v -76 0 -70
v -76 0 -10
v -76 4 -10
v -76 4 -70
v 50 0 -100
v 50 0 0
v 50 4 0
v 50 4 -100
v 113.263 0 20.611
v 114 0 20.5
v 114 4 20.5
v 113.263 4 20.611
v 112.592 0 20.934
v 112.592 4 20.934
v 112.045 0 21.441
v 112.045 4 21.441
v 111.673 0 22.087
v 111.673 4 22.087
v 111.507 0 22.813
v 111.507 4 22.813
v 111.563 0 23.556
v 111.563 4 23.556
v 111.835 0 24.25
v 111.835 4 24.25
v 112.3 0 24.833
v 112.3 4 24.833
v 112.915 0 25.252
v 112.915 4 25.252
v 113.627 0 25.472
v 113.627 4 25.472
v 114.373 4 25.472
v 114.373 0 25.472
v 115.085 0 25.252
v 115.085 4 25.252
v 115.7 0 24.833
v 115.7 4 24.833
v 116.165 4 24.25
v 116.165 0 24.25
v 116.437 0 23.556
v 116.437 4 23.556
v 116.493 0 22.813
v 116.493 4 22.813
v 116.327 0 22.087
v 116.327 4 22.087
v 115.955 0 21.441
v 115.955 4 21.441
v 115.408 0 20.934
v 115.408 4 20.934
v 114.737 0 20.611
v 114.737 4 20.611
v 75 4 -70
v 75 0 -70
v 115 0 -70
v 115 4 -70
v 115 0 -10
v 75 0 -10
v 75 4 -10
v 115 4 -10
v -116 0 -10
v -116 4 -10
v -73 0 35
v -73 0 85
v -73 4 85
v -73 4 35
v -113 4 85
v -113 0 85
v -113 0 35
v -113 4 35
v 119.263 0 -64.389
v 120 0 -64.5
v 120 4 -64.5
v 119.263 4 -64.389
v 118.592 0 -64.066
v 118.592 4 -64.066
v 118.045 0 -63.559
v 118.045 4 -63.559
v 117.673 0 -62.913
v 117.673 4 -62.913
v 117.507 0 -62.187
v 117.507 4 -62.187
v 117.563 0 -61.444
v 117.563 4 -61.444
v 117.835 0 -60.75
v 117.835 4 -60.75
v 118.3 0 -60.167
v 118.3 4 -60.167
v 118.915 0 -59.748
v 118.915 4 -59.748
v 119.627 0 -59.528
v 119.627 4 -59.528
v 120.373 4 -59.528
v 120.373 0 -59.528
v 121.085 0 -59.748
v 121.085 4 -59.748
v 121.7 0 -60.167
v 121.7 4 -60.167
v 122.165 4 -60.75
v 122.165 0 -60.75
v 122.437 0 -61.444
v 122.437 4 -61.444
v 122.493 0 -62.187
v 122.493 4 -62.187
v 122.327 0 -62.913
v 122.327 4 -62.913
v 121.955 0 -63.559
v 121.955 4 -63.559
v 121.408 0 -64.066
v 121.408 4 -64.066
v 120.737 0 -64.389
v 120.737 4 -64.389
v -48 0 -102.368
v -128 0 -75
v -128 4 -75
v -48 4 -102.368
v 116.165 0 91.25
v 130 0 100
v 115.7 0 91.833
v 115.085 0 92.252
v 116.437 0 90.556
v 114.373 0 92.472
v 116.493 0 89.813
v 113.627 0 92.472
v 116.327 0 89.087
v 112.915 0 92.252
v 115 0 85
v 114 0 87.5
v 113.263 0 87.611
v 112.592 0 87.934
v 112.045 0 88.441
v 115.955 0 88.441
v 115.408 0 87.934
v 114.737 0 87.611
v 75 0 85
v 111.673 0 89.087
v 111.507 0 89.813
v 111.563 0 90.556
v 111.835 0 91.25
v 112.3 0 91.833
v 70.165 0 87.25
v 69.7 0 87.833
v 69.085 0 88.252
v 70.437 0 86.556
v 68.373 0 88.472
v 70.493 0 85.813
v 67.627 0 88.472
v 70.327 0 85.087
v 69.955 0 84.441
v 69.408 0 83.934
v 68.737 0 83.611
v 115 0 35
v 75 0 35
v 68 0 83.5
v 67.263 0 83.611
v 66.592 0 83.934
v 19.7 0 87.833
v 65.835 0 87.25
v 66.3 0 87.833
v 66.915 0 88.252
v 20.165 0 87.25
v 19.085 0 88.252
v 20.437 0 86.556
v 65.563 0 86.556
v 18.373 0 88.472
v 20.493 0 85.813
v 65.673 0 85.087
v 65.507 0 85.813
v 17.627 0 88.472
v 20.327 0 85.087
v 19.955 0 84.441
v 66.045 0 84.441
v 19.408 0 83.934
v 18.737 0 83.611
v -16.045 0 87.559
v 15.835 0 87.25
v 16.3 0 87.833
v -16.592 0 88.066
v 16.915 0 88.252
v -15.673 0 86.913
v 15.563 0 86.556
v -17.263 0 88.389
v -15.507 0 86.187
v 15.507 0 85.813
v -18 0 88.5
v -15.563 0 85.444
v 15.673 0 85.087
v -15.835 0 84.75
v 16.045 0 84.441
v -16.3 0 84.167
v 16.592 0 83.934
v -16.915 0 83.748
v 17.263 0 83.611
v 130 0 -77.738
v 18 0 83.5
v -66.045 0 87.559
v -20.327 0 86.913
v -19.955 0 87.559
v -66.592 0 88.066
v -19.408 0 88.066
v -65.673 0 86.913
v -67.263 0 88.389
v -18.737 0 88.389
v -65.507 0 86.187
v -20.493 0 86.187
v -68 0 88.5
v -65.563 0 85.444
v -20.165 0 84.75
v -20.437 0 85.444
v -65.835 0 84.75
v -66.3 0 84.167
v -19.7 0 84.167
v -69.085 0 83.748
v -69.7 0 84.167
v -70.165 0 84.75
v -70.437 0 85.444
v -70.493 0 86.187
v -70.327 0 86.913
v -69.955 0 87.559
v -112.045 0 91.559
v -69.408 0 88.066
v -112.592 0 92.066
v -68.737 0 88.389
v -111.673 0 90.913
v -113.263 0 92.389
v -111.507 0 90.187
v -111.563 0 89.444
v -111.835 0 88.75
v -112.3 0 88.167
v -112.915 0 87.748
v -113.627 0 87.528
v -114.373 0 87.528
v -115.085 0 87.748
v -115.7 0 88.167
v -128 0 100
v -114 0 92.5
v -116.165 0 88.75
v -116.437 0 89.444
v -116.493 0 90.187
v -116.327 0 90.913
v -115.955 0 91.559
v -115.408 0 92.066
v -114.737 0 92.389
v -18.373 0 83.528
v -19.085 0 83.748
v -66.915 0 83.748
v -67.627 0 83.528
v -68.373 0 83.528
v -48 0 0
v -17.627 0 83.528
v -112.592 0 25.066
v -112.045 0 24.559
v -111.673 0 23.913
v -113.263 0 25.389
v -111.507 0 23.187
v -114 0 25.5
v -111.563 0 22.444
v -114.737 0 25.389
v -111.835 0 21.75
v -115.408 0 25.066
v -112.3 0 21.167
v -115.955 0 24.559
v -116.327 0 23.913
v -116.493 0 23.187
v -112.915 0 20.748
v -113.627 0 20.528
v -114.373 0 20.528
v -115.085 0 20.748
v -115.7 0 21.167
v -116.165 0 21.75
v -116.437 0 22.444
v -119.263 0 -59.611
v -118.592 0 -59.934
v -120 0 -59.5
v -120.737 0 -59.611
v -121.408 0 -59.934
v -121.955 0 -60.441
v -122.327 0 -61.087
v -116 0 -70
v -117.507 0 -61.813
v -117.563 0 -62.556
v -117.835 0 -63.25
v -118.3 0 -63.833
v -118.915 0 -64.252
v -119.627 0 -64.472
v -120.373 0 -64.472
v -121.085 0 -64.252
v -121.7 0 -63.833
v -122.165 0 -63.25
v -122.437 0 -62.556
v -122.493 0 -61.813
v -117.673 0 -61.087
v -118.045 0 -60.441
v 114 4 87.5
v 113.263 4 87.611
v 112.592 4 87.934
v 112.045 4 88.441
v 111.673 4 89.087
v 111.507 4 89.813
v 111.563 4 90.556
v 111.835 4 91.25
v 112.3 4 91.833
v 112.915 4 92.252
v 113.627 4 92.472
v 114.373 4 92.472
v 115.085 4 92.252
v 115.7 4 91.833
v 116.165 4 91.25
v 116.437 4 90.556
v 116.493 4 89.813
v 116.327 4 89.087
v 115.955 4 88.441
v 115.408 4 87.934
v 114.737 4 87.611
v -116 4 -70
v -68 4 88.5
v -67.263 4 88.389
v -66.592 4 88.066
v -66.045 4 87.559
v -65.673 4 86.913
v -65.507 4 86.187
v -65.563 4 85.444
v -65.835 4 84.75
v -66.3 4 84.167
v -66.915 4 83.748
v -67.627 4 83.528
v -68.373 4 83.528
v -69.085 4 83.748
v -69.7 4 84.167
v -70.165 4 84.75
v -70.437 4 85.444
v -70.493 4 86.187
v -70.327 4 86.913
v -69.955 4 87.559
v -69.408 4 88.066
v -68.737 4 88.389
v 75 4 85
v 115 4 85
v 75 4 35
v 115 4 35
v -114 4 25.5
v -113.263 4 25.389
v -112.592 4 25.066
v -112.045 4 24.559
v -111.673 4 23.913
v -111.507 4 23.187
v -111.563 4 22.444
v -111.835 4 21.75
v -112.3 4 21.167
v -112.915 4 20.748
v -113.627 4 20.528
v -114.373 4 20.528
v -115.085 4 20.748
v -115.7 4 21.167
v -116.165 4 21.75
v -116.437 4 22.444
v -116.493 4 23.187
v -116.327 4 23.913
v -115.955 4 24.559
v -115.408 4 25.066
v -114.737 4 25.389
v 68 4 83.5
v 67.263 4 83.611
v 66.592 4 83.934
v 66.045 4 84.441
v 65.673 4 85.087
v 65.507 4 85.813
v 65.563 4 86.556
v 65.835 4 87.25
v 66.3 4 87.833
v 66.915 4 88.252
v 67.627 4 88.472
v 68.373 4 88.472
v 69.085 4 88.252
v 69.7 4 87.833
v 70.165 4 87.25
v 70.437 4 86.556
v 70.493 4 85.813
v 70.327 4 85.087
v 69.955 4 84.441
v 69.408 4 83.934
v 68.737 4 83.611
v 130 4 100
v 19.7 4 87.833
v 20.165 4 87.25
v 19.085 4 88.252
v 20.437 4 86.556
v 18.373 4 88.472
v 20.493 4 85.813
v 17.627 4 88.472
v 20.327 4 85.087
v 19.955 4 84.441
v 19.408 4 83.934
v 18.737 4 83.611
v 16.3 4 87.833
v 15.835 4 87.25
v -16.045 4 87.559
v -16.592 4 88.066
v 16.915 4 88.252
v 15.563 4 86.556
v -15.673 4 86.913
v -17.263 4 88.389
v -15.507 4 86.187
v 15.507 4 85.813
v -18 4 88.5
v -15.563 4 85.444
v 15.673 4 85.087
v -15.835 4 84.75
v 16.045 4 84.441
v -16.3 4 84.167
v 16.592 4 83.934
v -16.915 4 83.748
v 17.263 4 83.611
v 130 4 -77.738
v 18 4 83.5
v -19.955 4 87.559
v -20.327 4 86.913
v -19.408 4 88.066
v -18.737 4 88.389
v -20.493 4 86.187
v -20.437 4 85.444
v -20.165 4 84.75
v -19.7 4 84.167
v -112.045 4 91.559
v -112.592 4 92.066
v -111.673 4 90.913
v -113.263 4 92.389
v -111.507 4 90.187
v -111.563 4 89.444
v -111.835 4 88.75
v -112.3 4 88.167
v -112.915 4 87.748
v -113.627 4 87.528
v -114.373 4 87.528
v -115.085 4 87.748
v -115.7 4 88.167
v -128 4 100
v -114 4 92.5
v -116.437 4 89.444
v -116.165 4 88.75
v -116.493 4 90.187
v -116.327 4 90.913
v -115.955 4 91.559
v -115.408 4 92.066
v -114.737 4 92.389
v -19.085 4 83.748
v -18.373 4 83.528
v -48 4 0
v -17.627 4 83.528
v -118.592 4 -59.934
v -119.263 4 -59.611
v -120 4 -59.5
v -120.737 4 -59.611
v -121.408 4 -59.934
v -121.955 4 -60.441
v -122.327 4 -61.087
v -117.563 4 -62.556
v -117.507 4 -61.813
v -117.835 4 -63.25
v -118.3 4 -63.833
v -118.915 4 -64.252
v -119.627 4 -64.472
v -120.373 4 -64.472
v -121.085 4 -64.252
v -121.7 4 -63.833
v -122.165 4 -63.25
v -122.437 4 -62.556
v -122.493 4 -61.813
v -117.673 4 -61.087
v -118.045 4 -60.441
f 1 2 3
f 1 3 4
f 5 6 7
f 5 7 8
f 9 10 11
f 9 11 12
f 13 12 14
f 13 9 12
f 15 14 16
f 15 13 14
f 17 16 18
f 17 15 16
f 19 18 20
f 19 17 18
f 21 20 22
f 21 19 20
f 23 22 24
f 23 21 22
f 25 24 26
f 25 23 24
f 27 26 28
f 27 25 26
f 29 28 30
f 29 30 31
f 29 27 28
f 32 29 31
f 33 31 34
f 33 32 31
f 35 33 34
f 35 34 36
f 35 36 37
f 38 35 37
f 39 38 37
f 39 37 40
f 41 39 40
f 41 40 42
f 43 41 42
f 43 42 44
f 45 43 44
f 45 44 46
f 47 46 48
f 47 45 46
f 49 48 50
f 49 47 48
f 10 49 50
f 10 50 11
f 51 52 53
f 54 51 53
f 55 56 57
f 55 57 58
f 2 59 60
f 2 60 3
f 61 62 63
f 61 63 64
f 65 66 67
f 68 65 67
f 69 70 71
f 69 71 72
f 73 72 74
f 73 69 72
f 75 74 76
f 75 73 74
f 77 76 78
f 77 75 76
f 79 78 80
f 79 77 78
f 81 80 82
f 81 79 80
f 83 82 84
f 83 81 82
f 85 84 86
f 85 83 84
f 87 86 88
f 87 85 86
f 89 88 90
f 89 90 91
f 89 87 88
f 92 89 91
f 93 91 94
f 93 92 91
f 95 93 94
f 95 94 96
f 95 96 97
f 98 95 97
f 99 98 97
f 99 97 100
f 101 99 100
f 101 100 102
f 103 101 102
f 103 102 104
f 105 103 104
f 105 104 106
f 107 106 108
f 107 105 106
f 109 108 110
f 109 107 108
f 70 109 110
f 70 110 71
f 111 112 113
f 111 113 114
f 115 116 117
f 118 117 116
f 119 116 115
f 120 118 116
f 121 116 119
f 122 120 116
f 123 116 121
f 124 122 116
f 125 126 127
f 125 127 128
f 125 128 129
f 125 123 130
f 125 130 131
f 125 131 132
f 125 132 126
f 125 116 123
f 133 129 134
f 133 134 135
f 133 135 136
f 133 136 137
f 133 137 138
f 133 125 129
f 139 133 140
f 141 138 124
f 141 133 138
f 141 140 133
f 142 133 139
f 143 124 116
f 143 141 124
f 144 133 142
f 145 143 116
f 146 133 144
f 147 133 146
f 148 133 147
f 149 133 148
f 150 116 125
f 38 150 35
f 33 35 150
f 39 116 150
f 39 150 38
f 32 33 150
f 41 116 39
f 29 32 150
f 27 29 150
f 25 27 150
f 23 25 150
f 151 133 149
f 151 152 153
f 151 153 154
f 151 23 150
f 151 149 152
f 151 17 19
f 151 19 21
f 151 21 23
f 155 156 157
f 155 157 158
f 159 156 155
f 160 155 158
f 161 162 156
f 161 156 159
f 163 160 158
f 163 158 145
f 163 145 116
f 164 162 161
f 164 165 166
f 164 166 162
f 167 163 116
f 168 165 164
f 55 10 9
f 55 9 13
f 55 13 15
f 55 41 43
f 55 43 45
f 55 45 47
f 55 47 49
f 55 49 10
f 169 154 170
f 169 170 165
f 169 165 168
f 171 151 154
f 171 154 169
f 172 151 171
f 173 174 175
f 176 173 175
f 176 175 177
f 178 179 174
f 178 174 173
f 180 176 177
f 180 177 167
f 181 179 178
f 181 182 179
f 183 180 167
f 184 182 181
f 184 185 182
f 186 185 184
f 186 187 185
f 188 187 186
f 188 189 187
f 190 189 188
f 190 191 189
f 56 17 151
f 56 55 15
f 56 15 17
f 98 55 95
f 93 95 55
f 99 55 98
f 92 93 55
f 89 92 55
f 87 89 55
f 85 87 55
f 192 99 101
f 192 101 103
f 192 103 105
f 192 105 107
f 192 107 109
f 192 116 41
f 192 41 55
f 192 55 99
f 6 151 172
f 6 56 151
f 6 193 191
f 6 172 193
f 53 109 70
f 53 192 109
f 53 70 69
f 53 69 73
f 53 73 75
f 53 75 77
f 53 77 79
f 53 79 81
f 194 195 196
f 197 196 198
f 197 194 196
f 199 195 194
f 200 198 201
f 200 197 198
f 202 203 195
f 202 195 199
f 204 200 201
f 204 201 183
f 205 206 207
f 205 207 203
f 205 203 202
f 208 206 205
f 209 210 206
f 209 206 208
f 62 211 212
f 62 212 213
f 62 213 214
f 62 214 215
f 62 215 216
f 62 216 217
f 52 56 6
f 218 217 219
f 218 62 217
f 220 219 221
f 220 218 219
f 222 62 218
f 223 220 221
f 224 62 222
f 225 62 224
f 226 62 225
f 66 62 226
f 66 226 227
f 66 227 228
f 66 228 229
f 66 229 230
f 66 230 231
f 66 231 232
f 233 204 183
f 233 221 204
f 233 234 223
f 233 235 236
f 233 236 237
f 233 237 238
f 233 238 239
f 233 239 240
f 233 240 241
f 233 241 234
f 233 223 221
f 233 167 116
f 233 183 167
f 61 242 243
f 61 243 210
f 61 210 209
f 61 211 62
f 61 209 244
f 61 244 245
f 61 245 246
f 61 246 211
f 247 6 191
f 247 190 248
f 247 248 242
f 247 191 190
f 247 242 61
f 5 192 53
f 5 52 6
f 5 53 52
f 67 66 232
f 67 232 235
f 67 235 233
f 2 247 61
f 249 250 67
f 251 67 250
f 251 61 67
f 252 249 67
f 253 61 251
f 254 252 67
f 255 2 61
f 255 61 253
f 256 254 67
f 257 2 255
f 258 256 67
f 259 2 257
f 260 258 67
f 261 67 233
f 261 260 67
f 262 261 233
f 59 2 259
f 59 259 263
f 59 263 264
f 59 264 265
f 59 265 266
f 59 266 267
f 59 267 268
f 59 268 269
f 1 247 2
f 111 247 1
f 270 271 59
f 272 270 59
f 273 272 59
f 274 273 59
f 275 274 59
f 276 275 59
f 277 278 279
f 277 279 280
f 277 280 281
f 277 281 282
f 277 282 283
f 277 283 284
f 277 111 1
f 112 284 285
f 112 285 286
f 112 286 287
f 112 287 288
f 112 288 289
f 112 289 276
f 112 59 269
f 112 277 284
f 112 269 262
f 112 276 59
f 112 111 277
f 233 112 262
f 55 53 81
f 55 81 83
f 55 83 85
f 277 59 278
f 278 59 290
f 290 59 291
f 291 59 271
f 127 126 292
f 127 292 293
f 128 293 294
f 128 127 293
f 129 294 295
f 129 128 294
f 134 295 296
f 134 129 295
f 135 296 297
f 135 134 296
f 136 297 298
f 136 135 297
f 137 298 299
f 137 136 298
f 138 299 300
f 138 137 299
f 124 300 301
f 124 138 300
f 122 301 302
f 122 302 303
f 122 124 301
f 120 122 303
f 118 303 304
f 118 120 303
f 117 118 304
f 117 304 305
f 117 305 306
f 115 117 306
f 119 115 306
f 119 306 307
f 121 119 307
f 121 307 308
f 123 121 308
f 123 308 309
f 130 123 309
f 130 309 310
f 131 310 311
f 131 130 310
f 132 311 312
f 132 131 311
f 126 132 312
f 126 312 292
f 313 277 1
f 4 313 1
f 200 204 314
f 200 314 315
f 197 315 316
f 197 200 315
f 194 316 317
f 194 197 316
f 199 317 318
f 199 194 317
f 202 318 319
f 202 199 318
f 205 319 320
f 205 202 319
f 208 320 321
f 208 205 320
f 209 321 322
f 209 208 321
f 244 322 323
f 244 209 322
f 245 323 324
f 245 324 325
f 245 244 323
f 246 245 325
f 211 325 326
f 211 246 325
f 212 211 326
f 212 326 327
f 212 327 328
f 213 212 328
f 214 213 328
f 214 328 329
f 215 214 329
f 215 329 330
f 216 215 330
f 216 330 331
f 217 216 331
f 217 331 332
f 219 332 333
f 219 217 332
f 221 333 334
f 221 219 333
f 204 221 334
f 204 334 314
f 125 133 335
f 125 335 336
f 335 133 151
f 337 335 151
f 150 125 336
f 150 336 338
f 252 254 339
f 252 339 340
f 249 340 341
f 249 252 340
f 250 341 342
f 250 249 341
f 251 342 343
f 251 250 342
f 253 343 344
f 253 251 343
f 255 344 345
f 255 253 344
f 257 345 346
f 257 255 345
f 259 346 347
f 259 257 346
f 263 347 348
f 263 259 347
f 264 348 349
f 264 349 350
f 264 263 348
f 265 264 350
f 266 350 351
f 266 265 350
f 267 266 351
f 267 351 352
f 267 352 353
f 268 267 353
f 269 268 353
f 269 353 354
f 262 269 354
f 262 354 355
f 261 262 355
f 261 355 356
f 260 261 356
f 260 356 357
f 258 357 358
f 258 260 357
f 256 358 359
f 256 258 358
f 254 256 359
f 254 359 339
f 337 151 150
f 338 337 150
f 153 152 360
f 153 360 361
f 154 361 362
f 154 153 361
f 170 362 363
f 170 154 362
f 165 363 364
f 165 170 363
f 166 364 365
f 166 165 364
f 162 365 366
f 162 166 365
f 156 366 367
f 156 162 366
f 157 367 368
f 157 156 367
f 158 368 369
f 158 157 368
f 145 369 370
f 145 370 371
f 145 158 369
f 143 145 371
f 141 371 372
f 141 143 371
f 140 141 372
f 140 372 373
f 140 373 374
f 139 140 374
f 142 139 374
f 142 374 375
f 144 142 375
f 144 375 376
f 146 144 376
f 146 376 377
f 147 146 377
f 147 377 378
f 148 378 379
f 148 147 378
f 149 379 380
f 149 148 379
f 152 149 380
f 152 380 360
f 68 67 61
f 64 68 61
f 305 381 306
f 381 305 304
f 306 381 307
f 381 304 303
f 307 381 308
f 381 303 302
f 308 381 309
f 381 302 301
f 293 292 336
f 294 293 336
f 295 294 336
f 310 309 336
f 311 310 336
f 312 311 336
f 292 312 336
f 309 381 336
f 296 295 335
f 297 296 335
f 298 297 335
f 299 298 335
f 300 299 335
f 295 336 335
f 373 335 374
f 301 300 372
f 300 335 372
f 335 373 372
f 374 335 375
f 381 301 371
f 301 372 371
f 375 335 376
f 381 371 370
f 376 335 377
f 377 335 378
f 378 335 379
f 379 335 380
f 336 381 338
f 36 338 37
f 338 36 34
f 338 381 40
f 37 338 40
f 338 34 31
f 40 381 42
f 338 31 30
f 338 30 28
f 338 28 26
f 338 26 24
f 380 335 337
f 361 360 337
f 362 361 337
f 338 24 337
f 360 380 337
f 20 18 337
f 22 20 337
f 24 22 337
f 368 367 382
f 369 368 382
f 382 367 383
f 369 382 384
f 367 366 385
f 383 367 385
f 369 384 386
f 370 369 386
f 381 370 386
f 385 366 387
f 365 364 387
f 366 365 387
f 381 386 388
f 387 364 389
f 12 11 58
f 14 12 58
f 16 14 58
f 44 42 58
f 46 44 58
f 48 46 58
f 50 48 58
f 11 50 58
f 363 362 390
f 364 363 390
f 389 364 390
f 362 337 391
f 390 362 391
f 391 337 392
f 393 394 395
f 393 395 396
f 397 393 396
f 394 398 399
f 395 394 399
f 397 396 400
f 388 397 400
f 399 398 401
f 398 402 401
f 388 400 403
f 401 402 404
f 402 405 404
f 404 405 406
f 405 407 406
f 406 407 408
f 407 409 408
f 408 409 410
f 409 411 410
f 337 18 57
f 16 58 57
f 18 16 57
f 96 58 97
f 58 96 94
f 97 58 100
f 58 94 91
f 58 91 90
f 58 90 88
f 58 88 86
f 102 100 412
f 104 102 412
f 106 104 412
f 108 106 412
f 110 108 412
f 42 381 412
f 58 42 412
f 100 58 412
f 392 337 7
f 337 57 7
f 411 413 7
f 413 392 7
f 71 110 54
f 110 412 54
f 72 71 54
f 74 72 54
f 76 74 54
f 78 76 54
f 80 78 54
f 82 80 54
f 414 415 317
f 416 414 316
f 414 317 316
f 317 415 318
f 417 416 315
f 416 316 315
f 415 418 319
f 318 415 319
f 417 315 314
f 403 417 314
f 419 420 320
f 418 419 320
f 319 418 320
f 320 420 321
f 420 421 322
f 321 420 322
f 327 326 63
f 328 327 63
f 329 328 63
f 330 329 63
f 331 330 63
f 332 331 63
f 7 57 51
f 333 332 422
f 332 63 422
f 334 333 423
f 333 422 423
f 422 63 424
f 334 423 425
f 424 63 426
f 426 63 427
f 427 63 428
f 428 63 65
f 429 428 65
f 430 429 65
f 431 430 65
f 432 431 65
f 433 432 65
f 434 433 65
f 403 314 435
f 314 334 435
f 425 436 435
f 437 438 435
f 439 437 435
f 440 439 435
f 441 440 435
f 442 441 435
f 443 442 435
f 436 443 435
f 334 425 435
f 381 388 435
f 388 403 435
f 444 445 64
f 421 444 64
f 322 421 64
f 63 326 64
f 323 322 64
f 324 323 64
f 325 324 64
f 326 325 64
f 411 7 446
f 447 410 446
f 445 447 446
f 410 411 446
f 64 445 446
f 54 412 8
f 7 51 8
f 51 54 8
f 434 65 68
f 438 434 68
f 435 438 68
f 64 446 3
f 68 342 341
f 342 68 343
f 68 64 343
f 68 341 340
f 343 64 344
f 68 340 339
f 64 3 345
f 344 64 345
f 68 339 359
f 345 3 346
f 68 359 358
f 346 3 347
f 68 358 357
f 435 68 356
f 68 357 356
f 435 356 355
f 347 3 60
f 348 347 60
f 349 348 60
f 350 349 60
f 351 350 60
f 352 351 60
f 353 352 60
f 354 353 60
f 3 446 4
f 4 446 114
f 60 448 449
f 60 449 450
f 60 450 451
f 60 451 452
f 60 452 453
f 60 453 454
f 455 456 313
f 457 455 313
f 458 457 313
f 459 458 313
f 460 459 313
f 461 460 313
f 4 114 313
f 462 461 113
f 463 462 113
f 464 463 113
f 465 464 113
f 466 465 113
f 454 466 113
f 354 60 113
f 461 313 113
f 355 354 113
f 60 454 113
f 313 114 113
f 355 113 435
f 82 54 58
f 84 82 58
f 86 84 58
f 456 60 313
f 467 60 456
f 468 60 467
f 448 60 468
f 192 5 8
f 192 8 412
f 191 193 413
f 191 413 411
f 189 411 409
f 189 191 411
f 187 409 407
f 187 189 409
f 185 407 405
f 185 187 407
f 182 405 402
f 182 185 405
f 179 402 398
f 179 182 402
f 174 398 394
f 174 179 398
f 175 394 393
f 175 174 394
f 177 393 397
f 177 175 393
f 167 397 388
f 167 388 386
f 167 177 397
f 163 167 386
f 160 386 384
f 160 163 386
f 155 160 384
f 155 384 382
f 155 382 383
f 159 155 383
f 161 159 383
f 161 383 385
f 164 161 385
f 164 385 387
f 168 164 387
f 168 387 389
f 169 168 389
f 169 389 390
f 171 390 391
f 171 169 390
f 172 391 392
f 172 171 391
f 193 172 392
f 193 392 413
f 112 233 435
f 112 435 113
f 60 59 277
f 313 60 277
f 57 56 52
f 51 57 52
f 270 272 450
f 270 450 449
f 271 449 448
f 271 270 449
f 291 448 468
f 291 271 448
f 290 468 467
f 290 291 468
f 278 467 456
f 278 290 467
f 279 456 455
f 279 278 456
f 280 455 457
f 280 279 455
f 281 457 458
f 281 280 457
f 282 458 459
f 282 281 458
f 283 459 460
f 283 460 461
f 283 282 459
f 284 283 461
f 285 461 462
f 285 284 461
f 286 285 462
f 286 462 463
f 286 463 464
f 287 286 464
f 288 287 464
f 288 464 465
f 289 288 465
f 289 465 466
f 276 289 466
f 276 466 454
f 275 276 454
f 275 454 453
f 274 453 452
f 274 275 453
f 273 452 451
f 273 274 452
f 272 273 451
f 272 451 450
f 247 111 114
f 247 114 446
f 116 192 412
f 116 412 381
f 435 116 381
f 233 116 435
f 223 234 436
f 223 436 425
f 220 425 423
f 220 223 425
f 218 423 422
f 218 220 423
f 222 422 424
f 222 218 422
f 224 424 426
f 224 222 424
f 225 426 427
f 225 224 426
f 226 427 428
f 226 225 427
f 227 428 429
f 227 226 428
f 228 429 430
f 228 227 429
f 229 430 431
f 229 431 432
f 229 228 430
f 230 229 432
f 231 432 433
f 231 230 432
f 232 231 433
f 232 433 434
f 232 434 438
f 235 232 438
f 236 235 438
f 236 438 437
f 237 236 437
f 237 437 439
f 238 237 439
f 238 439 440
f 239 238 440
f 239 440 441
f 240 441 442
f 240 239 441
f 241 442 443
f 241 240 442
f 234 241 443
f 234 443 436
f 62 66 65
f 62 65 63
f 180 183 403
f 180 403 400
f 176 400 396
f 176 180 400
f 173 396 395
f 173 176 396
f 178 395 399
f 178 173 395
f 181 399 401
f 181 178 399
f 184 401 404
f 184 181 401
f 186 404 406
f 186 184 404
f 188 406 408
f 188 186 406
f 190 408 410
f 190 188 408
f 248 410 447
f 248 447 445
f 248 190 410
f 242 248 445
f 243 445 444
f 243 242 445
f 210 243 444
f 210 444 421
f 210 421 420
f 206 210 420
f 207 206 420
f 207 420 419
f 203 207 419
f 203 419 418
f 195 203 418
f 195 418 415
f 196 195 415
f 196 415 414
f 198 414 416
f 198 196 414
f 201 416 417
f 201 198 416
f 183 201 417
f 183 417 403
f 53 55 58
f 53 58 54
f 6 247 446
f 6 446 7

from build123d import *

# Parameters (mm, degrees)
SKETCH1_R           = 2.5
SKETCH1_W           = 40
SKETCH1_H           = 50
SKETCH1_H_2         = 60
BOSS_EXTRUDE1_DEPTH = 4


with BuildPart() as part:
    # Sketch1 → Boss-Extrude1 (new body)
    with BuildSketch(Plane(origin=(0, 0, 0), x_dir=(1, 0, 0), z_dir=(0, 1, 0))):
        Polygon((-48, 102.368421053), (-48, 0), (50, 0), (50, 100), (130, 77.738349066), (130, -100), (-128, -100), (-128, 75), align=None)
        with Locations(Location((-114, -90, 0), (0, 0, 270))):
            Circle(SKETCH1_R, mode=Mode.SUBTRACT)
        with Locations(Location((-68, -86, 0), (0, 0, 270))):
            Circle(SKETCH1_R, mode=Mode.SUBTRACT)
        with Locations(Location((-18, -86, 0), (0, 0, 270))):
            Circle(SKETCH1_R, mode=Mode.SUBTRACT)
        with Locations(Location((-120, 62, 0), (0, 0, 270))):
            Circle(SKETCH1_R, mode=Mode.SUBTRACT)
        with Locations(Location((-114, -23, 0), (0, 0, 270))):
            Circle(SKETCH1_R, mode=Mode.SUBTRACT)
        with Locations(Location((18, -86, 0), (0, 0, 90))):
            Circle(SKETCH1_R, mode=Mode.SUBTRACT)
        with Locations(Location((68, -86, 0), (0, 0, 90))):
            Circle(SKETCH1_R, mode=Mode.SUBTRACT)
        with Locations(Location((114, -90, 0), (0, 0, 90))):
            Circle(SKETCH1_R, mode=Mode.SUBTRACT)
        with Locations(Location((114, -23, 0), (0, 0, 90))):
            Circle(SKETCH1_R, mode=Mode.SUBTRACT)
        with Locations(Location((120, 62, 0), (0, 0, 90))):
            Circle(SKETCH1_R, mode=Mode.SUBTRACT)
        with Locations((95, -60)):
            Rectangle(SKETCH1_W, SKETCH1_H, mode=Mode.SUBTRACT)
        with Locations((95, 40)):
            Rectangle(SKETCH1_W, SKETCH1_H_2, mode=Mode.SUBTRACT)
        with Locations((-96, 40)):
            Rectangle(SKETCH1_W, SKETCH1_H_2, mode=Mode.SUBTRACT)
        with Locations((-93, -60)):
            Rectangle(SKETCH1_W, SKETCH1_H, mode=Mode.SUBTRACT)
    extrude(amount=BOSS_EXTRUDE1_DEPTH)


solid = part.part
